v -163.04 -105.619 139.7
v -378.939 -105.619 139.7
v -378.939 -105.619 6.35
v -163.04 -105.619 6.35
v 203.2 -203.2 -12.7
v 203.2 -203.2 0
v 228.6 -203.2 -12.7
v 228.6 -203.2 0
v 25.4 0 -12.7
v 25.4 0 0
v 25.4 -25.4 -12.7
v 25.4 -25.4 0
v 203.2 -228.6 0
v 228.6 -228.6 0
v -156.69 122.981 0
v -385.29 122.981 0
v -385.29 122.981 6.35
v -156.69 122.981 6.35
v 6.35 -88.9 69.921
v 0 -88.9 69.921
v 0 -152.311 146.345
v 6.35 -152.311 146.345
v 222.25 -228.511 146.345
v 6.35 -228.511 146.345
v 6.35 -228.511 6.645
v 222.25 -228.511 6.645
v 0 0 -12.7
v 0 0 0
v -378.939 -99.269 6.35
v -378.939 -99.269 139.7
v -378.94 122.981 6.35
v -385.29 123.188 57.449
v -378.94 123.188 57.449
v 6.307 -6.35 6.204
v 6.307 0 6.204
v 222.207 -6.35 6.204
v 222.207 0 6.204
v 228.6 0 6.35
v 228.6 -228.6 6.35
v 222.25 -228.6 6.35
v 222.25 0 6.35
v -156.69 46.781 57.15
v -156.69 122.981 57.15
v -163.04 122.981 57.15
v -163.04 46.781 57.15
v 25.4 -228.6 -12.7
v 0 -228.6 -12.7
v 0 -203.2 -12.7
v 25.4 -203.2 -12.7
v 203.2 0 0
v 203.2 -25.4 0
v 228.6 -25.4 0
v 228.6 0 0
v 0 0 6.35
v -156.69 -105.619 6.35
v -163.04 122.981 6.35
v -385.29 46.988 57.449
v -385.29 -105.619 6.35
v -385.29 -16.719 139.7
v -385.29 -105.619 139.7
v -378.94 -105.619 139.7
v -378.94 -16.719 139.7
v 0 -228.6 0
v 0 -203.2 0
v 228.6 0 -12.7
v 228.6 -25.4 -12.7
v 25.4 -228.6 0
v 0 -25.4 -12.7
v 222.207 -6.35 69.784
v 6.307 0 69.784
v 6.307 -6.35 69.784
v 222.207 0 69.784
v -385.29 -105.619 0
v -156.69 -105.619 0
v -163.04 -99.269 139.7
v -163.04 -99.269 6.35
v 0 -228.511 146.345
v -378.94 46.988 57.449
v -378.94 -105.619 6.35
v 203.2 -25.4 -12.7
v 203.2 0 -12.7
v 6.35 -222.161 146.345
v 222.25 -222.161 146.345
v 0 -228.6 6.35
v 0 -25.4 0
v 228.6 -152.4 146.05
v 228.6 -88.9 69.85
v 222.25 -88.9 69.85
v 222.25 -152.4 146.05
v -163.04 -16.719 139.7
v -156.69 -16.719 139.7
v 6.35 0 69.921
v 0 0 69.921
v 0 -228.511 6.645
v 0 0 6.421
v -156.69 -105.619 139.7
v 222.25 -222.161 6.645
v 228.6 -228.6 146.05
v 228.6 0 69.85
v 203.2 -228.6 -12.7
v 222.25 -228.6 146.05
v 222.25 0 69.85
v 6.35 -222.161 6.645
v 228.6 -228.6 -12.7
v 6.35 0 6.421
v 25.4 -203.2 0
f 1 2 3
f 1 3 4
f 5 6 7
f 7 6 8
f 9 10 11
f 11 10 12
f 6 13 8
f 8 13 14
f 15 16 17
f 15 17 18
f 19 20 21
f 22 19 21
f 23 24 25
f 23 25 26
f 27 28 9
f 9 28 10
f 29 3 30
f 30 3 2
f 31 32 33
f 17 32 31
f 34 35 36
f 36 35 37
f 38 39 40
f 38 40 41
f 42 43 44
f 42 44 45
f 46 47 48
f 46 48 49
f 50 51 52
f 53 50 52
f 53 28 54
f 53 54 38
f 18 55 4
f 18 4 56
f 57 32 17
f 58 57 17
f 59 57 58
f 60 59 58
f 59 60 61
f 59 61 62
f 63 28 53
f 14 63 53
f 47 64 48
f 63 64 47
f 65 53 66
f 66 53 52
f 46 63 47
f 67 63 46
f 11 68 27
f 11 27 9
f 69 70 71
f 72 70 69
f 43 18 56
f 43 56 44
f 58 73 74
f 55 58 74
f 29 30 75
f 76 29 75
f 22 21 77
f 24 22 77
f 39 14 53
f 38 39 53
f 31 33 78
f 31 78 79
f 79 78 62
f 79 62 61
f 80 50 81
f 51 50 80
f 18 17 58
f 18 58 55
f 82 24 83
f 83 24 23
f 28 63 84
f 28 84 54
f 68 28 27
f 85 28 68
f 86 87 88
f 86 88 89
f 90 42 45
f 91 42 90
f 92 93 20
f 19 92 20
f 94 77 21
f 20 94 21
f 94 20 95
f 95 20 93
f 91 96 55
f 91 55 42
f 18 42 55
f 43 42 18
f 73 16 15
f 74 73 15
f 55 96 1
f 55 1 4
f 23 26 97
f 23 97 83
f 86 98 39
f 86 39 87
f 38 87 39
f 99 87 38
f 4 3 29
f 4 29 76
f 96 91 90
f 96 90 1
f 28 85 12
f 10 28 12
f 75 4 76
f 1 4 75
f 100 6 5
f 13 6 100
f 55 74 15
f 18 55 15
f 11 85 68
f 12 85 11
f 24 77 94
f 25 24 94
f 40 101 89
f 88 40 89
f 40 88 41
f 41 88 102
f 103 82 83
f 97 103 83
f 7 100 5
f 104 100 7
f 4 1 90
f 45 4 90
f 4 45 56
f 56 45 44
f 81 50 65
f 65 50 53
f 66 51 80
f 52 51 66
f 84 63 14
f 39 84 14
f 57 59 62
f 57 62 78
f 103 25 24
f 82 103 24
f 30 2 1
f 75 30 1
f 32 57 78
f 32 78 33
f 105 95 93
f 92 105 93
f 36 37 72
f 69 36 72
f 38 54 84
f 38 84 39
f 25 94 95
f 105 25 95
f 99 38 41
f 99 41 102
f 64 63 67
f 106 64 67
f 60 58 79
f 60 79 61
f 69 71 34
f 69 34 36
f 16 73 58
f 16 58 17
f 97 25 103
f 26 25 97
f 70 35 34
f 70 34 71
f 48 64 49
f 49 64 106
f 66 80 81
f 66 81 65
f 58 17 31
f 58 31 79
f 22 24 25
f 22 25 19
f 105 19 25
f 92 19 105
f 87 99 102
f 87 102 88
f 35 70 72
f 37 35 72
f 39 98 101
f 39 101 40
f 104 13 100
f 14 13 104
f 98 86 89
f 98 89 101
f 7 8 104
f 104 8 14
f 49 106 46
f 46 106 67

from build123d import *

# Parameters (mm, degrees)
F0_W      = 228.6
F0_H      = 228.6
F1_DEPTH  = 6.35
F2_W      = 25.4
F2_H      = 25.4
F3_DEPTH  = 12.7
F5_DEPTH  = 6.35
F7_DEPTH  = 6.35
F8_W      = 215.9
F8_H      = 63.5805330239
F9_DEPTH  = 6.35
F10_W     = 215.9
F10_H     = 139.7
F11_DEPTH = 6.35
F12_W     = 228.6
F12_H     = 228.6
F13_DEPTH = 6.35
F15_DEPTH = 6.35
F17_DEPTH = 6.35
F18_W     = 215.8993035555
F18_H     = 133.35
F19_DEPTH = 6.35


# Not quite as in the source:
# - a feature names something its author has since deleted; it is built from what else it names


with BuildPart() as f1:
    # F0 (on Top) → F1 (new body)
    with BuildSketch(Plane.XY):
        with Locations((114.3, -114.3)):
            Rectangle(F0_W, F0_H)
    extrude(amount=F1_DEPTH)


with BuildPart() as f3:
    # F2 (on face) → F3 (new body)
    with BuildSketch(Plane(origin=(0, 0, 0), x_dir=(1, 0, 0), z_dir=(0, 0, -1))):
        with Locations((12.7, 215.9)):
            Rectangle(F2_W, F2_H)
    extrude(amount=F3_DEPTH)


with BuildPart() as f3b:
    # F2 (on face) → F3, piece 2 (new body)
    with BuildSketch(Plane(origin=(0, 0, 0), x_dir=(1, 0, 0), z_dir=(0, 0, -1))):
        with Locations((215.9, 215.9)):
            Rectangle(F2_W, F2_H)
    extrude(amount=F3_DEPTH)


with BuildPart() as f3c:
    # F2 (on face) → F3, piece 3 (new body)
    with BuildSketch(Plane(origin=(0, 0, 0), x_dir=(1, 0, 0), z_dir=(0, 0, -1))):
        with Locations((12.7, 12.7)):
            Rectangle(F2_W, F2_H)
    extrude(amount=F3_DEPTH)


with BuildPart() as f3d:
    # F2 (on face) → F3, piece 4 (new body)
    with BuildSketch(Plane(origin=(0, 0, 0), x_dir=(1, 0, 0), z_dir=(0, 0, -1))):
        with Locations((215.9, 12.7)):
            Rectangle(F2_W, F2_H)
    extrude(amount=F3_DEPTH)


with BuildPart() as f5:
    # F4 (on Right) → F5 (new body)
    with BuildSketch(Plane.YZ):
        Polygon((-228.5113930702, 146.3453488544), (-228.5113930702, 6.6453488544), (0, 6.4208060503), (0, 69.9208060503), (-88.9, 69.9208060503), (-152.3113930702, 146.3453488544), align=None)
    extrude(amount=F5_DEPTH)


with BuildPart() as f7:
    # F6 (on face) → F7 (new body)
    with BuildSketch(Plane.YZ.offset(228.6)):
        Polygon((-228.6, 6.35), (0, 6.35), (0, 69.85), (-88.9, 69.85), (-152.4, 146.05), (-228.6, 146.05), align=None)
    extrude(amount=-F7_DEPTH)


with BuildPart() as f9:
    # F8 (on Front) → F9 (new body)
    with BuildSketch(Plane.XZ):
        with Locations((114.2569518656, 37.9939724226)):
            Rectangle(F8_W, F8_H)
    extrude(amount=F9_DEPTH)


with BuildPart() as f11:
    # F10 (on face) → F11 (new body)
    with BuildSketch(Plane.XZ.offset(228.5113930702)):
        with Locations((114.3, 76.4953488544)):
            Rectangle(F10_W, F10_H)
    extrude(amount=-F11_DEPTH)


with BuildPart() as f13:
    # F12 (on Top) → F13 (new body)
    with BuildSketch(Plane.XY):
        with Locations((-270.9899397628, 8.6805075407)):
            Rectangle(F12_W, F12_H)
    extrude(amount=F13_DEPTH)


with BuildPart() as f15:
    # F14 (on face) → F15 (new body)
    with BuildSketch(Plane(origin=(-385.2899397628, 0, 0), x_dir=(0, -1, 0), z_dir=(-1, 0, 0))):
        Polygon((-46.9879293919, 57.4492700398), (-123.1879293919, 57.4492700398), (-122.9805075407, 6.35), (105.6194924593, 6.35), (105.6194924593, 139.7), (16.7194924593, 139.7), align=None)
    extrude(amount=-F15_DEPTH)


with BuildPart() as f17:
    # F16 (on face) → F17 (new body)
    with BuildSketch(Plane.YZ.offset(-156.6899397628)):
        Polygon((-105.6194924593, 6.35), (122.9805075407, 6.35), (122.9805075407, 57.15), (46.7805075407, 57.15), (-16.7194924593, 139.7), (-105.6194924593, 139.7), align=None)
    extrude(amount=-F17_DEPTH)


with BuildPart() as f19:
    # F18 (on face) → F19 (new body)
    with BuildSketch(Plane.XZ.offset(105.6194924593)):
        with Locations((-270.9895297885, 73.025)):
            Rectangle(F18_W, F18_H)
    extrude(amount=-F19_DEPTH)


solid = Compound([f1.part, f3.part, f3b.part, f3c.part, f3d.part, f5.part, f7.part, f9.part, f11.part, f13.part, f15.part, f17.part, f19.part])
